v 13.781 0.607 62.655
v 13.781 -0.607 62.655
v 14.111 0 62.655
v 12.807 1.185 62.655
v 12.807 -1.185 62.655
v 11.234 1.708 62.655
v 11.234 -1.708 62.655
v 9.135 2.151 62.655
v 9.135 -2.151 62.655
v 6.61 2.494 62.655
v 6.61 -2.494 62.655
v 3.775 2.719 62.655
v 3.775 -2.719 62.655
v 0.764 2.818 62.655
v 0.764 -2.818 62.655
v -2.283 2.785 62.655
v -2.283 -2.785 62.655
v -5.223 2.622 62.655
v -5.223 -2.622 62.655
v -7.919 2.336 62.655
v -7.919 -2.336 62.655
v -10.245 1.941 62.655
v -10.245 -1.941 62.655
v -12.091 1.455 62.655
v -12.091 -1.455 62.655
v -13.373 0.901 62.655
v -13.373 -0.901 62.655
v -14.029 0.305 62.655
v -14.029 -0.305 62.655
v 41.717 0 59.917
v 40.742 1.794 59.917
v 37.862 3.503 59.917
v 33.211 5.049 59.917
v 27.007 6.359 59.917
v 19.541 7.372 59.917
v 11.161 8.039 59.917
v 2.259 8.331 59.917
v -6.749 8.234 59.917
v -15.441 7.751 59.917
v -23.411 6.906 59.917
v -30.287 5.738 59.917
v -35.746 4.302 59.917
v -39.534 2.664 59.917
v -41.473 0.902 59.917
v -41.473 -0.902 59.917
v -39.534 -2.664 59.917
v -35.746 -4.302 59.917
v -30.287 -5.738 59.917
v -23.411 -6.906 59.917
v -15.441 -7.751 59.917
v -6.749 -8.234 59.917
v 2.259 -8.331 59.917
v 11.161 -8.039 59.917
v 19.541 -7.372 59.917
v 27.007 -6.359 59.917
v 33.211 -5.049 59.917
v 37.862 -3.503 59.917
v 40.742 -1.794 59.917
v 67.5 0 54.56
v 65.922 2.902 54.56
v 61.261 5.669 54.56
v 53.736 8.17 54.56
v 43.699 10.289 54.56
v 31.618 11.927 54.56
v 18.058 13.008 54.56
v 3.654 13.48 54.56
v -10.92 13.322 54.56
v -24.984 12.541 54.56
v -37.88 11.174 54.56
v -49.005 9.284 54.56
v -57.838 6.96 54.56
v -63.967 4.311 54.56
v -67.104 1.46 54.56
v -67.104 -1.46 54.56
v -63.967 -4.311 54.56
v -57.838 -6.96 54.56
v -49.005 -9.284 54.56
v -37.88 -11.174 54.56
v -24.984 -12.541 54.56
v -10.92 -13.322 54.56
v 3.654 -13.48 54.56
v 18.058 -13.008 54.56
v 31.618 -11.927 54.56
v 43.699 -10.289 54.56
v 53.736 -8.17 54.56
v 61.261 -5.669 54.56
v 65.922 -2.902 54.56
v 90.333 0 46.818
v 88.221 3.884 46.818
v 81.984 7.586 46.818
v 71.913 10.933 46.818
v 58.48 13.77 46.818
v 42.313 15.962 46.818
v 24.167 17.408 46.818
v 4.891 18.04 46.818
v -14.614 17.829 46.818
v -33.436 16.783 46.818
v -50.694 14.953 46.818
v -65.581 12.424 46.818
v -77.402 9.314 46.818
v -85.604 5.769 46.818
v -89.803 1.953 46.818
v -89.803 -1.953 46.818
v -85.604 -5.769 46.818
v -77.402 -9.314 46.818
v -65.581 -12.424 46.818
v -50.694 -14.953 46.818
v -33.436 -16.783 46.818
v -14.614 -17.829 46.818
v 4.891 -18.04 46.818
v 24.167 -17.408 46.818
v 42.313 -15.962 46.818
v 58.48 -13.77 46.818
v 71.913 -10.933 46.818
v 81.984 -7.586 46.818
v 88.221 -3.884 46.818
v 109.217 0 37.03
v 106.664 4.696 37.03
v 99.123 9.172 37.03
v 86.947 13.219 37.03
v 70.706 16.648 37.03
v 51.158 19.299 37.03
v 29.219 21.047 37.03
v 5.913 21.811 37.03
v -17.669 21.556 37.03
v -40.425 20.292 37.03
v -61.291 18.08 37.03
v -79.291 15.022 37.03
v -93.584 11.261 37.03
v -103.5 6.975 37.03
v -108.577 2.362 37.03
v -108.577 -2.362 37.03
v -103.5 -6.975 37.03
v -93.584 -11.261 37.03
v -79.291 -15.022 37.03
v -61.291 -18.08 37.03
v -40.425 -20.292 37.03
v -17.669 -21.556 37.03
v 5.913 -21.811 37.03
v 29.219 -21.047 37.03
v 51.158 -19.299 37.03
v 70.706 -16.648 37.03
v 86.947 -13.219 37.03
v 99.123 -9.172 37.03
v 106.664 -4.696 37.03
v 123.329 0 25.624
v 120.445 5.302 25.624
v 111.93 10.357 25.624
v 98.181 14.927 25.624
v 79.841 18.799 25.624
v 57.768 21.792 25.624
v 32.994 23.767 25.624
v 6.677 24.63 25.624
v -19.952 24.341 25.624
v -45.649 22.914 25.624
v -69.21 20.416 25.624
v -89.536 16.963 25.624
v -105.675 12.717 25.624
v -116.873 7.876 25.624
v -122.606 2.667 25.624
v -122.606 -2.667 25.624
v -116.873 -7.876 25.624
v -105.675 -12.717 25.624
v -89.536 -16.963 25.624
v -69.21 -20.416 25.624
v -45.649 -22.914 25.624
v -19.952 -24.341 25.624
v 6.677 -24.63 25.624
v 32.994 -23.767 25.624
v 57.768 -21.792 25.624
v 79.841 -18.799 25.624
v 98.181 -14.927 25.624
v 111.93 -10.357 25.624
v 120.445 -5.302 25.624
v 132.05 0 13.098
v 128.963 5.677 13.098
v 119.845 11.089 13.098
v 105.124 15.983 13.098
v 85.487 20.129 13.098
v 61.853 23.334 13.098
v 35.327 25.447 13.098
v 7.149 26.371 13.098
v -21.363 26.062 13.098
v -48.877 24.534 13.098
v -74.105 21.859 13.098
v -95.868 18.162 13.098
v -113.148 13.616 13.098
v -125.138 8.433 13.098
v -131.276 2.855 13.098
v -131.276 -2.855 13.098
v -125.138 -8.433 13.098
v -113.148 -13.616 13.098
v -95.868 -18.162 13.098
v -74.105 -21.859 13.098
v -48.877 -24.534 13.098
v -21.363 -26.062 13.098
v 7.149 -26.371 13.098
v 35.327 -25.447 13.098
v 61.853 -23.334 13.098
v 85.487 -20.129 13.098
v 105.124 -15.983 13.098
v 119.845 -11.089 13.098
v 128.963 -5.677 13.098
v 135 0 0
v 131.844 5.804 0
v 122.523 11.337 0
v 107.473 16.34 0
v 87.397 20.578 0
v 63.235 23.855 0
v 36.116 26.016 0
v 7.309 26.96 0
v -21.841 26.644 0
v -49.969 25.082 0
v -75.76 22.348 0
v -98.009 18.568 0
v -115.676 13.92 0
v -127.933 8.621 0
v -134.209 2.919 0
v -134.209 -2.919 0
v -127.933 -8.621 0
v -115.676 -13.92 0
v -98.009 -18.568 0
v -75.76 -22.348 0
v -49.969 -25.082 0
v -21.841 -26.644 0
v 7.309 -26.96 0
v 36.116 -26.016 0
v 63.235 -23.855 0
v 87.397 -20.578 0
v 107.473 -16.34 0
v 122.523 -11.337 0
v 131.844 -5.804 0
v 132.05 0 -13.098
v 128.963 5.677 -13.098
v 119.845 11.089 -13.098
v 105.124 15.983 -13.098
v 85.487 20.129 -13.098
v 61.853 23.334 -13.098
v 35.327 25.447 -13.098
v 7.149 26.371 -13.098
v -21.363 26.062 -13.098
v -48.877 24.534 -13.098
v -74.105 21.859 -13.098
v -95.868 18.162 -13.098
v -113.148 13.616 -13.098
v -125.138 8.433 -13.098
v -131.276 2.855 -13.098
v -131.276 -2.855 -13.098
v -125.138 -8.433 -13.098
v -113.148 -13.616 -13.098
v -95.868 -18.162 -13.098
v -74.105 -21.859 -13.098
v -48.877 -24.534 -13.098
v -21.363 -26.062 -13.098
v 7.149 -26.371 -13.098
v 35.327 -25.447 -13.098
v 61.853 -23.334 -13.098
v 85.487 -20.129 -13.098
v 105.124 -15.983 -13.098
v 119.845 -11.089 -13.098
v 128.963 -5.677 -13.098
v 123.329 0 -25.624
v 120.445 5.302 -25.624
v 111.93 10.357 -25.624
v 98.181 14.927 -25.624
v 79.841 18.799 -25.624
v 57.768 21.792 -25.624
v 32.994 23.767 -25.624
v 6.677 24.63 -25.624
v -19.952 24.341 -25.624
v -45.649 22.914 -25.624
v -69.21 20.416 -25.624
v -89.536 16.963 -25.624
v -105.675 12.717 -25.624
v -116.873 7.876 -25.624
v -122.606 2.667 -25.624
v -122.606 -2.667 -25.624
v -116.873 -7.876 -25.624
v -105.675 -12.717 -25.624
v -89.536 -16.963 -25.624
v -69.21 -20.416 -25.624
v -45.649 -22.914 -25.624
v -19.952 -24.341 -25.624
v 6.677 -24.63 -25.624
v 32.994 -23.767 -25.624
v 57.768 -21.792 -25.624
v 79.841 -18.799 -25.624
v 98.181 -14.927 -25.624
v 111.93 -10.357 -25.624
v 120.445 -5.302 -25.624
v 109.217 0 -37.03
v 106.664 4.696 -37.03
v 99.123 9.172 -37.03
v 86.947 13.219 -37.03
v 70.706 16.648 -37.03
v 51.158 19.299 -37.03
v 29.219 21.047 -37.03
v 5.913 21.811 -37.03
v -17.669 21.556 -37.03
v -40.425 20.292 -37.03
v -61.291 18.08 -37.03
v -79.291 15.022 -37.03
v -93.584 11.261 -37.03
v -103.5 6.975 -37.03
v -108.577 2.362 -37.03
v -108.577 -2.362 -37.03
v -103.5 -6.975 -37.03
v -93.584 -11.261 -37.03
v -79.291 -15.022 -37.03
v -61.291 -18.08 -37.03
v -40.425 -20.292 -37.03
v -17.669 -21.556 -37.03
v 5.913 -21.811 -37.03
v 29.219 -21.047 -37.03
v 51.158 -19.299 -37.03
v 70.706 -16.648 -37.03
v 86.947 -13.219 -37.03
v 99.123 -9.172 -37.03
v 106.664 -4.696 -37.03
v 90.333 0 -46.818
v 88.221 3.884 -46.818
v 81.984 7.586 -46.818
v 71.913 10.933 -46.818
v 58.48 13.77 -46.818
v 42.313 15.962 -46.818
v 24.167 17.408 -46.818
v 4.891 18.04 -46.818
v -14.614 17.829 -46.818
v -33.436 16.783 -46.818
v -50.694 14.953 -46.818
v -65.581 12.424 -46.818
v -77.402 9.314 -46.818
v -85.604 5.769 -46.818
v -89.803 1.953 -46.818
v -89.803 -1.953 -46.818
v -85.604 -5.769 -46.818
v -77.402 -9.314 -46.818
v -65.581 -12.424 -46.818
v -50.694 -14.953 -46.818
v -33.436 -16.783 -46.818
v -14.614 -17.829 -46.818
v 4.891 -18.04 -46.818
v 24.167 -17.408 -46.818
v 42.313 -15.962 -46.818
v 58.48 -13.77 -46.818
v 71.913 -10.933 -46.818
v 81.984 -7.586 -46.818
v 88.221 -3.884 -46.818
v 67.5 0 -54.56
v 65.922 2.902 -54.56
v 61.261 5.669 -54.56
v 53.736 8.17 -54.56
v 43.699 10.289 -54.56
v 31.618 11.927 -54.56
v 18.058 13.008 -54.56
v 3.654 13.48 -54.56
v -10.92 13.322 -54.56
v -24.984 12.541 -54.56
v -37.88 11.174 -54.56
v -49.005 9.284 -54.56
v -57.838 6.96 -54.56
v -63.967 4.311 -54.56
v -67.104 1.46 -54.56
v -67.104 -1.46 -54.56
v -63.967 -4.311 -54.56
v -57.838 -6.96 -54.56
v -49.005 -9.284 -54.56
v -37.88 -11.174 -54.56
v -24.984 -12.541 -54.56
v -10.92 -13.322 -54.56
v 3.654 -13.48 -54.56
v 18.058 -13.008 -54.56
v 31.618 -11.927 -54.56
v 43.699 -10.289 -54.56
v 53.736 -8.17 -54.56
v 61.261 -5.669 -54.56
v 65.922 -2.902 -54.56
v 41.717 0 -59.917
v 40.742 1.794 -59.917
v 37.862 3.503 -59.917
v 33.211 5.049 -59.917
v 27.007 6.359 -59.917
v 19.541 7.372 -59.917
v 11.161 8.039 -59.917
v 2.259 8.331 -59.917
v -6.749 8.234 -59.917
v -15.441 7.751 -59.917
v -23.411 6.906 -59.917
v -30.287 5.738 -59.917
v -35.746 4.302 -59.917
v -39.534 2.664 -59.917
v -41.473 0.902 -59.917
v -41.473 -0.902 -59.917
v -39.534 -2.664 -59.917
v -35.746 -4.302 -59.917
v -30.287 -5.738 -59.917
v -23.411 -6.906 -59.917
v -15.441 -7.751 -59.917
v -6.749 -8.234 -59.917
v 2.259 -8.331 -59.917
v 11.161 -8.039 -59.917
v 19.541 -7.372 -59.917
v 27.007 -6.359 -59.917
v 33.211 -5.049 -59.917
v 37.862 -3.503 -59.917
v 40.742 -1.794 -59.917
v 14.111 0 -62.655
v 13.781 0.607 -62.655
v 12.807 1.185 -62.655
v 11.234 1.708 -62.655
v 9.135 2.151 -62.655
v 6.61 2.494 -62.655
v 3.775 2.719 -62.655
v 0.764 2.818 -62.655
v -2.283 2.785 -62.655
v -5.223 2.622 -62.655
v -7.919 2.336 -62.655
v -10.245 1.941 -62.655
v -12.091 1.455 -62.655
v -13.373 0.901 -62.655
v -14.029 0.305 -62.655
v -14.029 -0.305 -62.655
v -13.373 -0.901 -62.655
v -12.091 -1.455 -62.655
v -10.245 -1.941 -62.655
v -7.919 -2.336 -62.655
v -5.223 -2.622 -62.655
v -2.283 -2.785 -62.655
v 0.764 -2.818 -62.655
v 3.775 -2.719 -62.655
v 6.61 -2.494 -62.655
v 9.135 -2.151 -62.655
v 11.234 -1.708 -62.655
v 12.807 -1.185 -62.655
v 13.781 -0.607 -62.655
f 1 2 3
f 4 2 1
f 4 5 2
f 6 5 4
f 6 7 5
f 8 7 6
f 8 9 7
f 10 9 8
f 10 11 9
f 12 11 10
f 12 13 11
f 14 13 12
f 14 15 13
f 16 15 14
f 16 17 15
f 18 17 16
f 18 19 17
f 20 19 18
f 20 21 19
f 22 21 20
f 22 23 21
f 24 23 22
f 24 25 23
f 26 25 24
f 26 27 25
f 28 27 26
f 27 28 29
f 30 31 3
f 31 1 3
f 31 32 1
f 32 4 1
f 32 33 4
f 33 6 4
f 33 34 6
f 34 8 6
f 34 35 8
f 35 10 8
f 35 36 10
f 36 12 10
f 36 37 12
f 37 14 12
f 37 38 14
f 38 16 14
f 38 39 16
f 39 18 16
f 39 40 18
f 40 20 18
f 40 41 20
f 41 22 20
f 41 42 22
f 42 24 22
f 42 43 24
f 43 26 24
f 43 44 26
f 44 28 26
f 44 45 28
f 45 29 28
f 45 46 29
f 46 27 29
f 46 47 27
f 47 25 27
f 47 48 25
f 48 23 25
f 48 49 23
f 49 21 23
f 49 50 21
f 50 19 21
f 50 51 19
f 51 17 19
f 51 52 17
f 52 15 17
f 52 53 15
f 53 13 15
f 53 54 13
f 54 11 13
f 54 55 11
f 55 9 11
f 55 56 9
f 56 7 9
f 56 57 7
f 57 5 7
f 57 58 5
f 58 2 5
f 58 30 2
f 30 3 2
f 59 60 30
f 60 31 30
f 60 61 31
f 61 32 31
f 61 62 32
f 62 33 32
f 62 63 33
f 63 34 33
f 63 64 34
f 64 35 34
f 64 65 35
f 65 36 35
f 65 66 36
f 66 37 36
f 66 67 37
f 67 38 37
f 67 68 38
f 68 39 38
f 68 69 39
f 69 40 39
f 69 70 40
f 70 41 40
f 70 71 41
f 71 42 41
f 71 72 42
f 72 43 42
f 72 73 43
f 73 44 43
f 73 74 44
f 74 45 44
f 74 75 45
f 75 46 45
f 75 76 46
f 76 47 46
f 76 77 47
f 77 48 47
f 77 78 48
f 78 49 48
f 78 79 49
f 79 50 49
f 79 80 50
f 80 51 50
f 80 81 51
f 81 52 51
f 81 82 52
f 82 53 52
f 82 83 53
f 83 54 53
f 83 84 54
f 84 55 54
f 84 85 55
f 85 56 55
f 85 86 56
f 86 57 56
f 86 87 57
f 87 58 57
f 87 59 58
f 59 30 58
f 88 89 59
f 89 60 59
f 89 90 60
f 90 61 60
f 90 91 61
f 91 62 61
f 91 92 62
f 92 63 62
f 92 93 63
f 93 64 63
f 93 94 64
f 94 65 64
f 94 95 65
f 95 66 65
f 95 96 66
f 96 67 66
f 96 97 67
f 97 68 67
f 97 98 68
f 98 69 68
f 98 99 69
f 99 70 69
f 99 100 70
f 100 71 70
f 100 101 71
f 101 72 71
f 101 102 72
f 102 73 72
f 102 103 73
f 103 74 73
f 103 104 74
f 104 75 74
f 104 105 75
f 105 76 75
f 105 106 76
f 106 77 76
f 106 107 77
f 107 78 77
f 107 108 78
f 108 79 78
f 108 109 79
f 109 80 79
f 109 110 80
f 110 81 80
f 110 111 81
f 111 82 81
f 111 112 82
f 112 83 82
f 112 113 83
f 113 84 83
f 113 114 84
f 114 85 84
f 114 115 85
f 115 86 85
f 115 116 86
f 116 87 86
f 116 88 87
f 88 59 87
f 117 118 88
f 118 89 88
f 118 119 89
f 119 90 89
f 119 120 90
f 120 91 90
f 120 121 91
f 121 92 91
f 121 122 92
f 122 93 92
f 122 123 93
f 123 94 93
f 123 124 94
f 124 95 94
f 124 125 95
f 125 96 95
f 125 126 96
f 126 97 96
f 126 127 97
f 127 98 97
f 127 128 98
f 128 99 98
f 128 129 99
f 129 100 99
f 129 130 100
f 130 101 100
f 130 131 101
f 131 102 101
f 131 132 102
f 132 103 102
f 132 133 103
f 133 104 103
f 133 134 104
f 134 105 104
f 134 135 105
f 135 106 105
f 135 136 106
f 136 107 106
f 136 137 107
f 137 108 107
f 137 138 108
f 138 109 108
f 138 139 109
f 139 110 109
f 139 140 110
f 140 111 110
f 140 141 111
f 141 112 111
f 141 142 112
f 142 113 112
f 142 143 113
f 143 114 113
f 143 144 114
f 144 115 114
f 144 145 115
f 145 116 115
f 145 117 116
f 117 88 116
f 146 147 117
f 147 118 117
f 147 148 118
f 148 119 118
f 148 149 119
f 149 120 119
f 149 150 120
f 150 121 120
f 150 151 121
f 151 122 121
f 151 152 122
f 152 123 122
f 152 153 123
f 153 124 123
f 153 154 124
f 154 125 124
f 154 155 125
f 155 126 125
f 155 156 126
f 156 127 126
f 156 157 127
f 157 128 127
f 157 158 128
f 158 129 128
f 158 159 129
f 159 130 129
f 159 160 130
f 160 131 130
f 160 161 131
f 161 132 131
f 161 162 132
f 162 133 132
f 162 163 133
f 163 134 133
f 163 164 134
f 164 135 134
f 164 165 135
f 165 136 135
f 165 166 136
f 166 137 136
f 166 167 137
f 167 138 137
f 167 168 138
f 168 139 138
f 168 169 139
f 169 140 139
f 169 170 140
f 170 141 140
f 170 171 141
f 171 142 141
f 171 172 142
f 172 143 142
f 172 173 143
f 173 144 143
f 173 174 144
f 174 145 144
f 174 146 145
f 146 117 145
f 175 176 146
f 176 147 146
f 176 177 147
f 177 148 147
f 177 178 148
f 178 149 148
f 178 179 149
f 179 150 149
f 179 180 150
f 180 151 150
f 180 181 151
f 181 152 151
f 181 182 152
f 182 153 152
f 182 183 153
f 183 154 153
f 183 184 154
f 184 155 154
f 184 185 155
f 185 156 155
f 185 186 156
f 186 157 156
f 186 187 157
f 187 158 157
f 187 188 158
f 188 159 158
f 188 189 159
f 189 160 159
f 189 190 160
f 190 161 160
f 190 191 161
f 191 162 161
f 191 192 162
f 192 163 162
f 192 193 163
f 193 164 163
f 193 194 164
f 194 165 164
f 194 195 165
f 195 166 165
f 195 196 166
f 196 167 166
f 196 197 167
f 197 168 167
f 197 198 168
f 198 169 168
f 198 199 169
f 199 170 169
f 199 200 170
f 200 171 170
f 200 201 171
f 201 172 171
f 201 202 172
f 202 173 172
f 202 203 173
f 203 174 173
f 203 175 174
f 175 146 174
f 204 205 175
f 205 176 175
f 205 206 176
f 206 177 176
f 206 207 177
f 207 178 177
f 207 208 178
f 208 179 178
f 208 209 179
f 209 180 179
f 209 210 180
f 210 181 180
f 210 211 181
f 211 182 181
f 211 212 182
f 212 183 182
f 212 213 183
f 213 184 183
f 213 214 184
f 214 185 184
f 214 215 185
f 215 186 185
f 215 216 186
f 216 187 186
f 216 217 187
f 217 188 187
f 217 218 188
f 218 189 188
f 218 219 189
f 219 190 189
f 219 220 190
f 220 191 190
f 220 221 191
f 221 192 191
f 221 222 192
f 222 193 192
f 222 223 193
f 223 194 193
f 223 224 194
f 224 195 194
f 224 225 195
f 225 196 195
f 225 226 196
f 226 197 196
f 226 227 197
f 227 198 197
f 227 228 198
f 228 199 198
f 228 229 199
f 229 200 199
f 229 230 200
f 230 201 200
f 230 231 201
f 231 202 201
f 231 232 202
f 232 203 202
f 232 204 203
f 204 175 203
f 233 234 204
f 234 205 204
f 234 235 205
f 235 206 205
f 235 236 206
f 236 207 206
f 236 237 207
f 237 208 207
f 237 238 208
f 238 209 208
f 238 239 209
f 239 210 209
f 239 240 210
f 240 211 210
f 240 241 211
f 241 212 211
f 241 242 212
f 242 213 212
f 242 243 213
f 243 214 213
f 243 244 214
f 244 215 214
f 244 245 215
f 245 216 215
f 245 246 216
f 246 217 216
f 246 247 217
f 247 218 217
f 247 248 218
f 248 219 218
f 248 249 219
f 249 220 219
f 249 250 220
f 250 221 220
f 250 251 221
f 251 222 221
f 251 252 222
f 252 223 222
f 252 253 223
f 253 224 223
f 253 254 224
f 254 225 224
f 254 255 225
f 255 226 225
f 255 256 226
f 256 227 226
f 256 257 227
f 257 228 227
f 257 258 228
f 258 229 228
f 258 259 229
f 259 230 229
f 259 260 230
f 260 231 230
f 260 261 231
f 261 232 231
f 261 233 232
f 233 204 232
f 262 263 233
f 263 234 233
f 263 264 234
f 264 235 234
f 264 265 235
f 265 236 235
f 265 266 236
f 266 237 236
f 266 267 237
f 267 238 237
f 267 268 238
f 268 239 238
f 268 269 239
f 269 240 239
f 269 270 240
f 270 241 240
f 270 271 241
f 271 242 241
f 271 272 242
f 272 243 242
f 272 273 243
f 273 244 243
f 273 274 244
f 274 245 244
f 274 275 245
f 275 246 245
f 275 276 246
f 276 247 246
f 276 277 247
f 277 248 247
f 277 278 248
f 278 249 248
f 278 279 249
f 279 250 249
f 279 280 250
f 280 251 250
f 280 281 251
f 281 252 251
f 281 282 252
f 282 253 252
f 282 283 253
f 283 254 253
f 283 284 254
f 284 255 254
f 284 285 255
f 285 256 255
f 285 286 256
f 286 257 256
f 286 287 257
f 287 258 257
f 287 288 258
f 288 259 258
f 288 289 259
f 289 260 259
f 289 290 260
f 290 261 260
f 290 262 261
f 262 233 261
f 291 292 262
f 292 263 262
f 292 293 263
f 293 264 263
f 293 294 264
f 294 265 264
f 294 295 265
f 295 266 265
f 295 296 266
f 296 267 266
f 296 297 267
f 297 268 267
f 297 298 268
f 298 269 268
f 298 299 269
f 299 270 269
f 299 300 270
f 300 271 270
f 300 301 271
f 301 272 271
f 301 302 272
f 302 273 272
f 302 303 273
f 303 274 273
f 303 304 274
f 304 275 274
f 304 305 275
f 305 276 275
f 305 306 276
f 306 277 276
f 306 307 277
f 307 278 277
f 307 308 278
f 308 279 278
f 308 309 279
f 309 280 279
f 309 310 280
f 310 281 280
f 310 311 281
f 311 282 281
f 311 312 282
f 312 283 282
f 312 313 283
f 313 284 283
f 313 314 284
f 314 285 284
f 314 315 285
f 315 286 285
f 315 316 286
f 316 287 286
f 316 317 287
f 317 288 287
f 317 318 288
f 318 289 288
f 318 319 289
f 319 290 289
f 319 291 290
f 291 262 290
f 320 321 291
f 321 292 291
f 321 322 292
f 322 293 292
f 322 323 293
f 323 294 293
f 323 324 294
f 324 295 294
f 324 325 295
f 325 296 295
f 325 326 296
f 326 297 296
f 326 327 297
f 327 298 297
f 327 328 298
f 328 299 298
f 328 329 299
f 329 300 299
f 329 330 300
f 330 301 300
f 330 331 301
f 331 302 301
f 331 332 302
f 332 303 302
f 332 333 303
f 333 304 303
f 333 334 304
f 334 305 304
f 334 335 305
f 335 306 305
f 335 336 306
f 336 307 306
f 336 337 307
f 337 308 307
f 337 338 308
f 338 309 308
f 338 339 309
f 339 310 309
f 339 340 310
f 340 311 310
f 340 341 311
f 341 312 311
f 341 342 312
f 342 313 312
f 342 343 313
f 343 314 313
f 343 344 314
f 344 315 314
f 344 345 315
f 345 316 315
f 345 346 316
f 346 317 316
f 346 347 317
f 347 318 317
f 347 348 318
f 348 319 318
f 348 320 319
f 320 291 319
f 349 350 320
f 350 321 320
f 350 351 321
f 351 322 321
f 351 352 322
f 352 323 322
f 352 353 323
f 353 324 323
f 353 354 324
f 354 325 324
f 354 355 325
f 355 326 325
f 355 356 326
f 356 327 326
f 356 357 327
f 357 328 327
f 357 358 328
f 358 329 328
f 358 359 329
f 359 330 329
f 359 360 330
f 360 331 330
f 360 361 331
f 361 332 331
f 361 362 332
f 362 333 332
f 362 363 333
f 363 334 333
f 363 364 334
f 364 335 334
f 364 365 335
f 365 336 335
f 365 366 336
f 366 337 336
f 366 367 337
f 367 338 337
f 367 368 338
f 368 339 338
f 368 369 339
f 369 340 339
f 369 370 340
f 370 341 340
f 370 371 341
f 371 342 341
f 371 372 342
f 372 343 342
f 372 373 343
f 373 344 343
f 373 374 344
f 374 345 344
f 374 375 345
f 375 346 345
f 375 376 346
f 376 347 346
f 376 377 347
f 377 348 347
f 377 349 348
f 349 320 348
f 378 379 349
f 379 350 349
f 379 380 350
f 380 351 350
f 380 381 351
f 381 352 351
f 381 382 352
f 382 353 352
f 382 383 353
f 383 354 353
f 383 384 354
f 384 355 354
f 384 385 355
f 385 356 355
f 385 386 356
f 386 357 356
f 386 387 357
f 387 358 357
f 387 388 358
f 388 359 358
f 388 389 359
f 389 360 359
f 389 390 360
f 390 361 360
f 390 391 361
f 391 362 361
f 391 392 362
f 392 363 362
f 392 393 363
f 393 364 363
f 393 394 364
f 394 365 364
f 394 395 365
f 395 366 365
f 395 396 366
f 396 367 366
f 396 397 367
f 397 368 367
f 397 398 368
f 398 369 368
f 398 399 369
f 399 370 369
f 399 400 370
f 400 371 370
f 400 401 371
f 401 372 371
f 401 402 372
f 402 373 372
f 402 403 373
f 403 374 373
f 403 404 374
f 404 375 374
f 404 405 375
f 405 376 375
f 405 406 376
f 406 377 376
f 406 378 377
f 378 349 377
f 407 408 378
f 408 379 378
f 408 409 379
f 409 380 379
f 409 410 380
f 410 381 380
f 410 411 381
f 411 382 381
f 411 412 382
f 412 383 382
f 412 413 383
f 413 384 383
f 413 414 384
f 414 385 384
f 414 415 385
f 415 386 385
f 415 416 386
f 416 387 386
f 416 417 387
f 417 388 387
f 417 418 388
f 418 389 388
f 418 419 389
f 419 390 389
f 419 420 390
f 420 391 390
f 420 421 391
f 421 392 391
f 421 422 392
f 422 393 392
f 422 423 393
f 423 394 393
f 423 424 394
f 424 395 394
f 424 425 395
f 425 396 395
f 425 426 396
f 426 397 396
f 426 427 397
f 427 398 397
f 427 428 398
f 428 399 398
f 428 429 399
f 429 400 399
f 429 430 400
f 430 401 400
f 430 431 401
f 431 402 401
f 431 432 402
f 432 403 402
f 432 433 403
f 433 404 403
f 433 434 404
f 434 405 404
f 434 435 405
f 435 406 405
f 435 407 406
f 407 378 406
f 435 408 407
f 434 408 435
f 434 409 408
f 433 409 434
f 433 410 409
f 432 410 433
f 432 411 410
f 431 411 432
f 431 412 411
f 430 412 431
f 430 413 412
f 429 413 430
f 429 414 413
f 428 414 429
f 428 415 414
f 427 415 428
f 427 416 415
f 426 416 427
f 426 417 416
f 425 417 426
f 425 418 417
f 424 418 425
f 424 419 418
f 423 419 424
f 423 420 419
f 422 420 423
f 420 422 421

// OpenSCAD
// Generated by SolidPython 1.0.1 on 2020-07-29 00:46:51


scale(v = [15, 3, 7]) {
	sphere(r = 9);
}
/***********************************************
*********      SolidPython code:      **********
************************************************
 
# import packages: SolidPython
from solid import *
from solid.utils import *
from itertools import chain, combinations, permutations


class Resize:

    def __init__(self, scad_file):
        self.scad_file = scad_file
        #self.scad_file = import_scad(scad_file)
        # cone/cylinder param:
        self.r1 = 0
        self.r2 = 0
        self.h = 0
        # rectangular prism param:
        self.w = 0
        self.l = 0
        # ellipse param:
        self.r = 0

    # import OpenScad code (file name corresponds to shape)


    # classify shape + parameters
    def assign(self, param1, param2, param3):
        if self.scad_file == 'cone.scad':
            self.r1 = param1
            self.r2 = param2
            self.h = param3
        elif self.scad_file == 'cylinder.scad':
            self.r1 = param1
            self.r2 = param2
            self.h = param3
        elif self.scad_file == 'rectangularPrism.scad':
            self.h = param1
            self.l = param2
            self.w = param3
        else:
            self.r = param1
            self.h = param2

    # resize parameters
    def iterate(self):
        x = range(3, 20, 2)
        i = 1
        if self.scad_file == 'cone.scad':
            tempList = list(permutations(x, 2))
            for temp in tempList:
                param1 = temp[0]
                param2 = temp[1]
                filepath = 'produced_scad_files/' + 'cone' + str(param1) + '_' + str(param2) + '_' + '.scad'
                scad_render_to_file(cylinder(h=param1, r1=param2, r2=0), filepath)

        elif self.scad_file == 'cylinder.scad':
            tempList = list(permutations(x, 3))
            for temp in tempList:
                param1 = temp[0]
                param2 = temp[1]
                filepath = 'produced_scad_files/' + 'cylinder' + str(param1) + '_' + str(param2) + '_' + '.scad'
                scad_render_to_file(cylinder(h=param1, r1=param2, r2=param2), filepath)

        elif self.scad_file == 'rectangularPrism.scad':
            tempList = list(permutations(x, 3))
            for temp in tempList:
                param1 = temp[0]
                param2 = temp[1]
                param3 = temp[2]
                filepath = 'produced_scad_files/' + 'rectangularPrism' + str(param1) + '_' + str(param2) + '_' + str(
                    param3) + '.scad'
                scad_render_to_file(cube(size=(param1, param2, param3)), filepath)

        elif self.scad_file == 'ellipse.scad':
            tempList = list(permutations(x, 4))
            for temp in tempList:
                param1 = temp[0]
                param2 = temp[1]
                param3 = temp[2]
                param4 = temp[3]
                filepath = 'produced_scad_files/' + 'ellipse' + str(param1) + '_' + str(param2) + '_' + str(param3) + '_' + str(param4) + '.scad'
                scad_render_to_file(scale([param1, param2, param3])(sphere(r=param4)), filepath)

    def render_to_scadfile(self):
        scad_render_to_file(scad, 'example.scad') 
 
************************************************/
